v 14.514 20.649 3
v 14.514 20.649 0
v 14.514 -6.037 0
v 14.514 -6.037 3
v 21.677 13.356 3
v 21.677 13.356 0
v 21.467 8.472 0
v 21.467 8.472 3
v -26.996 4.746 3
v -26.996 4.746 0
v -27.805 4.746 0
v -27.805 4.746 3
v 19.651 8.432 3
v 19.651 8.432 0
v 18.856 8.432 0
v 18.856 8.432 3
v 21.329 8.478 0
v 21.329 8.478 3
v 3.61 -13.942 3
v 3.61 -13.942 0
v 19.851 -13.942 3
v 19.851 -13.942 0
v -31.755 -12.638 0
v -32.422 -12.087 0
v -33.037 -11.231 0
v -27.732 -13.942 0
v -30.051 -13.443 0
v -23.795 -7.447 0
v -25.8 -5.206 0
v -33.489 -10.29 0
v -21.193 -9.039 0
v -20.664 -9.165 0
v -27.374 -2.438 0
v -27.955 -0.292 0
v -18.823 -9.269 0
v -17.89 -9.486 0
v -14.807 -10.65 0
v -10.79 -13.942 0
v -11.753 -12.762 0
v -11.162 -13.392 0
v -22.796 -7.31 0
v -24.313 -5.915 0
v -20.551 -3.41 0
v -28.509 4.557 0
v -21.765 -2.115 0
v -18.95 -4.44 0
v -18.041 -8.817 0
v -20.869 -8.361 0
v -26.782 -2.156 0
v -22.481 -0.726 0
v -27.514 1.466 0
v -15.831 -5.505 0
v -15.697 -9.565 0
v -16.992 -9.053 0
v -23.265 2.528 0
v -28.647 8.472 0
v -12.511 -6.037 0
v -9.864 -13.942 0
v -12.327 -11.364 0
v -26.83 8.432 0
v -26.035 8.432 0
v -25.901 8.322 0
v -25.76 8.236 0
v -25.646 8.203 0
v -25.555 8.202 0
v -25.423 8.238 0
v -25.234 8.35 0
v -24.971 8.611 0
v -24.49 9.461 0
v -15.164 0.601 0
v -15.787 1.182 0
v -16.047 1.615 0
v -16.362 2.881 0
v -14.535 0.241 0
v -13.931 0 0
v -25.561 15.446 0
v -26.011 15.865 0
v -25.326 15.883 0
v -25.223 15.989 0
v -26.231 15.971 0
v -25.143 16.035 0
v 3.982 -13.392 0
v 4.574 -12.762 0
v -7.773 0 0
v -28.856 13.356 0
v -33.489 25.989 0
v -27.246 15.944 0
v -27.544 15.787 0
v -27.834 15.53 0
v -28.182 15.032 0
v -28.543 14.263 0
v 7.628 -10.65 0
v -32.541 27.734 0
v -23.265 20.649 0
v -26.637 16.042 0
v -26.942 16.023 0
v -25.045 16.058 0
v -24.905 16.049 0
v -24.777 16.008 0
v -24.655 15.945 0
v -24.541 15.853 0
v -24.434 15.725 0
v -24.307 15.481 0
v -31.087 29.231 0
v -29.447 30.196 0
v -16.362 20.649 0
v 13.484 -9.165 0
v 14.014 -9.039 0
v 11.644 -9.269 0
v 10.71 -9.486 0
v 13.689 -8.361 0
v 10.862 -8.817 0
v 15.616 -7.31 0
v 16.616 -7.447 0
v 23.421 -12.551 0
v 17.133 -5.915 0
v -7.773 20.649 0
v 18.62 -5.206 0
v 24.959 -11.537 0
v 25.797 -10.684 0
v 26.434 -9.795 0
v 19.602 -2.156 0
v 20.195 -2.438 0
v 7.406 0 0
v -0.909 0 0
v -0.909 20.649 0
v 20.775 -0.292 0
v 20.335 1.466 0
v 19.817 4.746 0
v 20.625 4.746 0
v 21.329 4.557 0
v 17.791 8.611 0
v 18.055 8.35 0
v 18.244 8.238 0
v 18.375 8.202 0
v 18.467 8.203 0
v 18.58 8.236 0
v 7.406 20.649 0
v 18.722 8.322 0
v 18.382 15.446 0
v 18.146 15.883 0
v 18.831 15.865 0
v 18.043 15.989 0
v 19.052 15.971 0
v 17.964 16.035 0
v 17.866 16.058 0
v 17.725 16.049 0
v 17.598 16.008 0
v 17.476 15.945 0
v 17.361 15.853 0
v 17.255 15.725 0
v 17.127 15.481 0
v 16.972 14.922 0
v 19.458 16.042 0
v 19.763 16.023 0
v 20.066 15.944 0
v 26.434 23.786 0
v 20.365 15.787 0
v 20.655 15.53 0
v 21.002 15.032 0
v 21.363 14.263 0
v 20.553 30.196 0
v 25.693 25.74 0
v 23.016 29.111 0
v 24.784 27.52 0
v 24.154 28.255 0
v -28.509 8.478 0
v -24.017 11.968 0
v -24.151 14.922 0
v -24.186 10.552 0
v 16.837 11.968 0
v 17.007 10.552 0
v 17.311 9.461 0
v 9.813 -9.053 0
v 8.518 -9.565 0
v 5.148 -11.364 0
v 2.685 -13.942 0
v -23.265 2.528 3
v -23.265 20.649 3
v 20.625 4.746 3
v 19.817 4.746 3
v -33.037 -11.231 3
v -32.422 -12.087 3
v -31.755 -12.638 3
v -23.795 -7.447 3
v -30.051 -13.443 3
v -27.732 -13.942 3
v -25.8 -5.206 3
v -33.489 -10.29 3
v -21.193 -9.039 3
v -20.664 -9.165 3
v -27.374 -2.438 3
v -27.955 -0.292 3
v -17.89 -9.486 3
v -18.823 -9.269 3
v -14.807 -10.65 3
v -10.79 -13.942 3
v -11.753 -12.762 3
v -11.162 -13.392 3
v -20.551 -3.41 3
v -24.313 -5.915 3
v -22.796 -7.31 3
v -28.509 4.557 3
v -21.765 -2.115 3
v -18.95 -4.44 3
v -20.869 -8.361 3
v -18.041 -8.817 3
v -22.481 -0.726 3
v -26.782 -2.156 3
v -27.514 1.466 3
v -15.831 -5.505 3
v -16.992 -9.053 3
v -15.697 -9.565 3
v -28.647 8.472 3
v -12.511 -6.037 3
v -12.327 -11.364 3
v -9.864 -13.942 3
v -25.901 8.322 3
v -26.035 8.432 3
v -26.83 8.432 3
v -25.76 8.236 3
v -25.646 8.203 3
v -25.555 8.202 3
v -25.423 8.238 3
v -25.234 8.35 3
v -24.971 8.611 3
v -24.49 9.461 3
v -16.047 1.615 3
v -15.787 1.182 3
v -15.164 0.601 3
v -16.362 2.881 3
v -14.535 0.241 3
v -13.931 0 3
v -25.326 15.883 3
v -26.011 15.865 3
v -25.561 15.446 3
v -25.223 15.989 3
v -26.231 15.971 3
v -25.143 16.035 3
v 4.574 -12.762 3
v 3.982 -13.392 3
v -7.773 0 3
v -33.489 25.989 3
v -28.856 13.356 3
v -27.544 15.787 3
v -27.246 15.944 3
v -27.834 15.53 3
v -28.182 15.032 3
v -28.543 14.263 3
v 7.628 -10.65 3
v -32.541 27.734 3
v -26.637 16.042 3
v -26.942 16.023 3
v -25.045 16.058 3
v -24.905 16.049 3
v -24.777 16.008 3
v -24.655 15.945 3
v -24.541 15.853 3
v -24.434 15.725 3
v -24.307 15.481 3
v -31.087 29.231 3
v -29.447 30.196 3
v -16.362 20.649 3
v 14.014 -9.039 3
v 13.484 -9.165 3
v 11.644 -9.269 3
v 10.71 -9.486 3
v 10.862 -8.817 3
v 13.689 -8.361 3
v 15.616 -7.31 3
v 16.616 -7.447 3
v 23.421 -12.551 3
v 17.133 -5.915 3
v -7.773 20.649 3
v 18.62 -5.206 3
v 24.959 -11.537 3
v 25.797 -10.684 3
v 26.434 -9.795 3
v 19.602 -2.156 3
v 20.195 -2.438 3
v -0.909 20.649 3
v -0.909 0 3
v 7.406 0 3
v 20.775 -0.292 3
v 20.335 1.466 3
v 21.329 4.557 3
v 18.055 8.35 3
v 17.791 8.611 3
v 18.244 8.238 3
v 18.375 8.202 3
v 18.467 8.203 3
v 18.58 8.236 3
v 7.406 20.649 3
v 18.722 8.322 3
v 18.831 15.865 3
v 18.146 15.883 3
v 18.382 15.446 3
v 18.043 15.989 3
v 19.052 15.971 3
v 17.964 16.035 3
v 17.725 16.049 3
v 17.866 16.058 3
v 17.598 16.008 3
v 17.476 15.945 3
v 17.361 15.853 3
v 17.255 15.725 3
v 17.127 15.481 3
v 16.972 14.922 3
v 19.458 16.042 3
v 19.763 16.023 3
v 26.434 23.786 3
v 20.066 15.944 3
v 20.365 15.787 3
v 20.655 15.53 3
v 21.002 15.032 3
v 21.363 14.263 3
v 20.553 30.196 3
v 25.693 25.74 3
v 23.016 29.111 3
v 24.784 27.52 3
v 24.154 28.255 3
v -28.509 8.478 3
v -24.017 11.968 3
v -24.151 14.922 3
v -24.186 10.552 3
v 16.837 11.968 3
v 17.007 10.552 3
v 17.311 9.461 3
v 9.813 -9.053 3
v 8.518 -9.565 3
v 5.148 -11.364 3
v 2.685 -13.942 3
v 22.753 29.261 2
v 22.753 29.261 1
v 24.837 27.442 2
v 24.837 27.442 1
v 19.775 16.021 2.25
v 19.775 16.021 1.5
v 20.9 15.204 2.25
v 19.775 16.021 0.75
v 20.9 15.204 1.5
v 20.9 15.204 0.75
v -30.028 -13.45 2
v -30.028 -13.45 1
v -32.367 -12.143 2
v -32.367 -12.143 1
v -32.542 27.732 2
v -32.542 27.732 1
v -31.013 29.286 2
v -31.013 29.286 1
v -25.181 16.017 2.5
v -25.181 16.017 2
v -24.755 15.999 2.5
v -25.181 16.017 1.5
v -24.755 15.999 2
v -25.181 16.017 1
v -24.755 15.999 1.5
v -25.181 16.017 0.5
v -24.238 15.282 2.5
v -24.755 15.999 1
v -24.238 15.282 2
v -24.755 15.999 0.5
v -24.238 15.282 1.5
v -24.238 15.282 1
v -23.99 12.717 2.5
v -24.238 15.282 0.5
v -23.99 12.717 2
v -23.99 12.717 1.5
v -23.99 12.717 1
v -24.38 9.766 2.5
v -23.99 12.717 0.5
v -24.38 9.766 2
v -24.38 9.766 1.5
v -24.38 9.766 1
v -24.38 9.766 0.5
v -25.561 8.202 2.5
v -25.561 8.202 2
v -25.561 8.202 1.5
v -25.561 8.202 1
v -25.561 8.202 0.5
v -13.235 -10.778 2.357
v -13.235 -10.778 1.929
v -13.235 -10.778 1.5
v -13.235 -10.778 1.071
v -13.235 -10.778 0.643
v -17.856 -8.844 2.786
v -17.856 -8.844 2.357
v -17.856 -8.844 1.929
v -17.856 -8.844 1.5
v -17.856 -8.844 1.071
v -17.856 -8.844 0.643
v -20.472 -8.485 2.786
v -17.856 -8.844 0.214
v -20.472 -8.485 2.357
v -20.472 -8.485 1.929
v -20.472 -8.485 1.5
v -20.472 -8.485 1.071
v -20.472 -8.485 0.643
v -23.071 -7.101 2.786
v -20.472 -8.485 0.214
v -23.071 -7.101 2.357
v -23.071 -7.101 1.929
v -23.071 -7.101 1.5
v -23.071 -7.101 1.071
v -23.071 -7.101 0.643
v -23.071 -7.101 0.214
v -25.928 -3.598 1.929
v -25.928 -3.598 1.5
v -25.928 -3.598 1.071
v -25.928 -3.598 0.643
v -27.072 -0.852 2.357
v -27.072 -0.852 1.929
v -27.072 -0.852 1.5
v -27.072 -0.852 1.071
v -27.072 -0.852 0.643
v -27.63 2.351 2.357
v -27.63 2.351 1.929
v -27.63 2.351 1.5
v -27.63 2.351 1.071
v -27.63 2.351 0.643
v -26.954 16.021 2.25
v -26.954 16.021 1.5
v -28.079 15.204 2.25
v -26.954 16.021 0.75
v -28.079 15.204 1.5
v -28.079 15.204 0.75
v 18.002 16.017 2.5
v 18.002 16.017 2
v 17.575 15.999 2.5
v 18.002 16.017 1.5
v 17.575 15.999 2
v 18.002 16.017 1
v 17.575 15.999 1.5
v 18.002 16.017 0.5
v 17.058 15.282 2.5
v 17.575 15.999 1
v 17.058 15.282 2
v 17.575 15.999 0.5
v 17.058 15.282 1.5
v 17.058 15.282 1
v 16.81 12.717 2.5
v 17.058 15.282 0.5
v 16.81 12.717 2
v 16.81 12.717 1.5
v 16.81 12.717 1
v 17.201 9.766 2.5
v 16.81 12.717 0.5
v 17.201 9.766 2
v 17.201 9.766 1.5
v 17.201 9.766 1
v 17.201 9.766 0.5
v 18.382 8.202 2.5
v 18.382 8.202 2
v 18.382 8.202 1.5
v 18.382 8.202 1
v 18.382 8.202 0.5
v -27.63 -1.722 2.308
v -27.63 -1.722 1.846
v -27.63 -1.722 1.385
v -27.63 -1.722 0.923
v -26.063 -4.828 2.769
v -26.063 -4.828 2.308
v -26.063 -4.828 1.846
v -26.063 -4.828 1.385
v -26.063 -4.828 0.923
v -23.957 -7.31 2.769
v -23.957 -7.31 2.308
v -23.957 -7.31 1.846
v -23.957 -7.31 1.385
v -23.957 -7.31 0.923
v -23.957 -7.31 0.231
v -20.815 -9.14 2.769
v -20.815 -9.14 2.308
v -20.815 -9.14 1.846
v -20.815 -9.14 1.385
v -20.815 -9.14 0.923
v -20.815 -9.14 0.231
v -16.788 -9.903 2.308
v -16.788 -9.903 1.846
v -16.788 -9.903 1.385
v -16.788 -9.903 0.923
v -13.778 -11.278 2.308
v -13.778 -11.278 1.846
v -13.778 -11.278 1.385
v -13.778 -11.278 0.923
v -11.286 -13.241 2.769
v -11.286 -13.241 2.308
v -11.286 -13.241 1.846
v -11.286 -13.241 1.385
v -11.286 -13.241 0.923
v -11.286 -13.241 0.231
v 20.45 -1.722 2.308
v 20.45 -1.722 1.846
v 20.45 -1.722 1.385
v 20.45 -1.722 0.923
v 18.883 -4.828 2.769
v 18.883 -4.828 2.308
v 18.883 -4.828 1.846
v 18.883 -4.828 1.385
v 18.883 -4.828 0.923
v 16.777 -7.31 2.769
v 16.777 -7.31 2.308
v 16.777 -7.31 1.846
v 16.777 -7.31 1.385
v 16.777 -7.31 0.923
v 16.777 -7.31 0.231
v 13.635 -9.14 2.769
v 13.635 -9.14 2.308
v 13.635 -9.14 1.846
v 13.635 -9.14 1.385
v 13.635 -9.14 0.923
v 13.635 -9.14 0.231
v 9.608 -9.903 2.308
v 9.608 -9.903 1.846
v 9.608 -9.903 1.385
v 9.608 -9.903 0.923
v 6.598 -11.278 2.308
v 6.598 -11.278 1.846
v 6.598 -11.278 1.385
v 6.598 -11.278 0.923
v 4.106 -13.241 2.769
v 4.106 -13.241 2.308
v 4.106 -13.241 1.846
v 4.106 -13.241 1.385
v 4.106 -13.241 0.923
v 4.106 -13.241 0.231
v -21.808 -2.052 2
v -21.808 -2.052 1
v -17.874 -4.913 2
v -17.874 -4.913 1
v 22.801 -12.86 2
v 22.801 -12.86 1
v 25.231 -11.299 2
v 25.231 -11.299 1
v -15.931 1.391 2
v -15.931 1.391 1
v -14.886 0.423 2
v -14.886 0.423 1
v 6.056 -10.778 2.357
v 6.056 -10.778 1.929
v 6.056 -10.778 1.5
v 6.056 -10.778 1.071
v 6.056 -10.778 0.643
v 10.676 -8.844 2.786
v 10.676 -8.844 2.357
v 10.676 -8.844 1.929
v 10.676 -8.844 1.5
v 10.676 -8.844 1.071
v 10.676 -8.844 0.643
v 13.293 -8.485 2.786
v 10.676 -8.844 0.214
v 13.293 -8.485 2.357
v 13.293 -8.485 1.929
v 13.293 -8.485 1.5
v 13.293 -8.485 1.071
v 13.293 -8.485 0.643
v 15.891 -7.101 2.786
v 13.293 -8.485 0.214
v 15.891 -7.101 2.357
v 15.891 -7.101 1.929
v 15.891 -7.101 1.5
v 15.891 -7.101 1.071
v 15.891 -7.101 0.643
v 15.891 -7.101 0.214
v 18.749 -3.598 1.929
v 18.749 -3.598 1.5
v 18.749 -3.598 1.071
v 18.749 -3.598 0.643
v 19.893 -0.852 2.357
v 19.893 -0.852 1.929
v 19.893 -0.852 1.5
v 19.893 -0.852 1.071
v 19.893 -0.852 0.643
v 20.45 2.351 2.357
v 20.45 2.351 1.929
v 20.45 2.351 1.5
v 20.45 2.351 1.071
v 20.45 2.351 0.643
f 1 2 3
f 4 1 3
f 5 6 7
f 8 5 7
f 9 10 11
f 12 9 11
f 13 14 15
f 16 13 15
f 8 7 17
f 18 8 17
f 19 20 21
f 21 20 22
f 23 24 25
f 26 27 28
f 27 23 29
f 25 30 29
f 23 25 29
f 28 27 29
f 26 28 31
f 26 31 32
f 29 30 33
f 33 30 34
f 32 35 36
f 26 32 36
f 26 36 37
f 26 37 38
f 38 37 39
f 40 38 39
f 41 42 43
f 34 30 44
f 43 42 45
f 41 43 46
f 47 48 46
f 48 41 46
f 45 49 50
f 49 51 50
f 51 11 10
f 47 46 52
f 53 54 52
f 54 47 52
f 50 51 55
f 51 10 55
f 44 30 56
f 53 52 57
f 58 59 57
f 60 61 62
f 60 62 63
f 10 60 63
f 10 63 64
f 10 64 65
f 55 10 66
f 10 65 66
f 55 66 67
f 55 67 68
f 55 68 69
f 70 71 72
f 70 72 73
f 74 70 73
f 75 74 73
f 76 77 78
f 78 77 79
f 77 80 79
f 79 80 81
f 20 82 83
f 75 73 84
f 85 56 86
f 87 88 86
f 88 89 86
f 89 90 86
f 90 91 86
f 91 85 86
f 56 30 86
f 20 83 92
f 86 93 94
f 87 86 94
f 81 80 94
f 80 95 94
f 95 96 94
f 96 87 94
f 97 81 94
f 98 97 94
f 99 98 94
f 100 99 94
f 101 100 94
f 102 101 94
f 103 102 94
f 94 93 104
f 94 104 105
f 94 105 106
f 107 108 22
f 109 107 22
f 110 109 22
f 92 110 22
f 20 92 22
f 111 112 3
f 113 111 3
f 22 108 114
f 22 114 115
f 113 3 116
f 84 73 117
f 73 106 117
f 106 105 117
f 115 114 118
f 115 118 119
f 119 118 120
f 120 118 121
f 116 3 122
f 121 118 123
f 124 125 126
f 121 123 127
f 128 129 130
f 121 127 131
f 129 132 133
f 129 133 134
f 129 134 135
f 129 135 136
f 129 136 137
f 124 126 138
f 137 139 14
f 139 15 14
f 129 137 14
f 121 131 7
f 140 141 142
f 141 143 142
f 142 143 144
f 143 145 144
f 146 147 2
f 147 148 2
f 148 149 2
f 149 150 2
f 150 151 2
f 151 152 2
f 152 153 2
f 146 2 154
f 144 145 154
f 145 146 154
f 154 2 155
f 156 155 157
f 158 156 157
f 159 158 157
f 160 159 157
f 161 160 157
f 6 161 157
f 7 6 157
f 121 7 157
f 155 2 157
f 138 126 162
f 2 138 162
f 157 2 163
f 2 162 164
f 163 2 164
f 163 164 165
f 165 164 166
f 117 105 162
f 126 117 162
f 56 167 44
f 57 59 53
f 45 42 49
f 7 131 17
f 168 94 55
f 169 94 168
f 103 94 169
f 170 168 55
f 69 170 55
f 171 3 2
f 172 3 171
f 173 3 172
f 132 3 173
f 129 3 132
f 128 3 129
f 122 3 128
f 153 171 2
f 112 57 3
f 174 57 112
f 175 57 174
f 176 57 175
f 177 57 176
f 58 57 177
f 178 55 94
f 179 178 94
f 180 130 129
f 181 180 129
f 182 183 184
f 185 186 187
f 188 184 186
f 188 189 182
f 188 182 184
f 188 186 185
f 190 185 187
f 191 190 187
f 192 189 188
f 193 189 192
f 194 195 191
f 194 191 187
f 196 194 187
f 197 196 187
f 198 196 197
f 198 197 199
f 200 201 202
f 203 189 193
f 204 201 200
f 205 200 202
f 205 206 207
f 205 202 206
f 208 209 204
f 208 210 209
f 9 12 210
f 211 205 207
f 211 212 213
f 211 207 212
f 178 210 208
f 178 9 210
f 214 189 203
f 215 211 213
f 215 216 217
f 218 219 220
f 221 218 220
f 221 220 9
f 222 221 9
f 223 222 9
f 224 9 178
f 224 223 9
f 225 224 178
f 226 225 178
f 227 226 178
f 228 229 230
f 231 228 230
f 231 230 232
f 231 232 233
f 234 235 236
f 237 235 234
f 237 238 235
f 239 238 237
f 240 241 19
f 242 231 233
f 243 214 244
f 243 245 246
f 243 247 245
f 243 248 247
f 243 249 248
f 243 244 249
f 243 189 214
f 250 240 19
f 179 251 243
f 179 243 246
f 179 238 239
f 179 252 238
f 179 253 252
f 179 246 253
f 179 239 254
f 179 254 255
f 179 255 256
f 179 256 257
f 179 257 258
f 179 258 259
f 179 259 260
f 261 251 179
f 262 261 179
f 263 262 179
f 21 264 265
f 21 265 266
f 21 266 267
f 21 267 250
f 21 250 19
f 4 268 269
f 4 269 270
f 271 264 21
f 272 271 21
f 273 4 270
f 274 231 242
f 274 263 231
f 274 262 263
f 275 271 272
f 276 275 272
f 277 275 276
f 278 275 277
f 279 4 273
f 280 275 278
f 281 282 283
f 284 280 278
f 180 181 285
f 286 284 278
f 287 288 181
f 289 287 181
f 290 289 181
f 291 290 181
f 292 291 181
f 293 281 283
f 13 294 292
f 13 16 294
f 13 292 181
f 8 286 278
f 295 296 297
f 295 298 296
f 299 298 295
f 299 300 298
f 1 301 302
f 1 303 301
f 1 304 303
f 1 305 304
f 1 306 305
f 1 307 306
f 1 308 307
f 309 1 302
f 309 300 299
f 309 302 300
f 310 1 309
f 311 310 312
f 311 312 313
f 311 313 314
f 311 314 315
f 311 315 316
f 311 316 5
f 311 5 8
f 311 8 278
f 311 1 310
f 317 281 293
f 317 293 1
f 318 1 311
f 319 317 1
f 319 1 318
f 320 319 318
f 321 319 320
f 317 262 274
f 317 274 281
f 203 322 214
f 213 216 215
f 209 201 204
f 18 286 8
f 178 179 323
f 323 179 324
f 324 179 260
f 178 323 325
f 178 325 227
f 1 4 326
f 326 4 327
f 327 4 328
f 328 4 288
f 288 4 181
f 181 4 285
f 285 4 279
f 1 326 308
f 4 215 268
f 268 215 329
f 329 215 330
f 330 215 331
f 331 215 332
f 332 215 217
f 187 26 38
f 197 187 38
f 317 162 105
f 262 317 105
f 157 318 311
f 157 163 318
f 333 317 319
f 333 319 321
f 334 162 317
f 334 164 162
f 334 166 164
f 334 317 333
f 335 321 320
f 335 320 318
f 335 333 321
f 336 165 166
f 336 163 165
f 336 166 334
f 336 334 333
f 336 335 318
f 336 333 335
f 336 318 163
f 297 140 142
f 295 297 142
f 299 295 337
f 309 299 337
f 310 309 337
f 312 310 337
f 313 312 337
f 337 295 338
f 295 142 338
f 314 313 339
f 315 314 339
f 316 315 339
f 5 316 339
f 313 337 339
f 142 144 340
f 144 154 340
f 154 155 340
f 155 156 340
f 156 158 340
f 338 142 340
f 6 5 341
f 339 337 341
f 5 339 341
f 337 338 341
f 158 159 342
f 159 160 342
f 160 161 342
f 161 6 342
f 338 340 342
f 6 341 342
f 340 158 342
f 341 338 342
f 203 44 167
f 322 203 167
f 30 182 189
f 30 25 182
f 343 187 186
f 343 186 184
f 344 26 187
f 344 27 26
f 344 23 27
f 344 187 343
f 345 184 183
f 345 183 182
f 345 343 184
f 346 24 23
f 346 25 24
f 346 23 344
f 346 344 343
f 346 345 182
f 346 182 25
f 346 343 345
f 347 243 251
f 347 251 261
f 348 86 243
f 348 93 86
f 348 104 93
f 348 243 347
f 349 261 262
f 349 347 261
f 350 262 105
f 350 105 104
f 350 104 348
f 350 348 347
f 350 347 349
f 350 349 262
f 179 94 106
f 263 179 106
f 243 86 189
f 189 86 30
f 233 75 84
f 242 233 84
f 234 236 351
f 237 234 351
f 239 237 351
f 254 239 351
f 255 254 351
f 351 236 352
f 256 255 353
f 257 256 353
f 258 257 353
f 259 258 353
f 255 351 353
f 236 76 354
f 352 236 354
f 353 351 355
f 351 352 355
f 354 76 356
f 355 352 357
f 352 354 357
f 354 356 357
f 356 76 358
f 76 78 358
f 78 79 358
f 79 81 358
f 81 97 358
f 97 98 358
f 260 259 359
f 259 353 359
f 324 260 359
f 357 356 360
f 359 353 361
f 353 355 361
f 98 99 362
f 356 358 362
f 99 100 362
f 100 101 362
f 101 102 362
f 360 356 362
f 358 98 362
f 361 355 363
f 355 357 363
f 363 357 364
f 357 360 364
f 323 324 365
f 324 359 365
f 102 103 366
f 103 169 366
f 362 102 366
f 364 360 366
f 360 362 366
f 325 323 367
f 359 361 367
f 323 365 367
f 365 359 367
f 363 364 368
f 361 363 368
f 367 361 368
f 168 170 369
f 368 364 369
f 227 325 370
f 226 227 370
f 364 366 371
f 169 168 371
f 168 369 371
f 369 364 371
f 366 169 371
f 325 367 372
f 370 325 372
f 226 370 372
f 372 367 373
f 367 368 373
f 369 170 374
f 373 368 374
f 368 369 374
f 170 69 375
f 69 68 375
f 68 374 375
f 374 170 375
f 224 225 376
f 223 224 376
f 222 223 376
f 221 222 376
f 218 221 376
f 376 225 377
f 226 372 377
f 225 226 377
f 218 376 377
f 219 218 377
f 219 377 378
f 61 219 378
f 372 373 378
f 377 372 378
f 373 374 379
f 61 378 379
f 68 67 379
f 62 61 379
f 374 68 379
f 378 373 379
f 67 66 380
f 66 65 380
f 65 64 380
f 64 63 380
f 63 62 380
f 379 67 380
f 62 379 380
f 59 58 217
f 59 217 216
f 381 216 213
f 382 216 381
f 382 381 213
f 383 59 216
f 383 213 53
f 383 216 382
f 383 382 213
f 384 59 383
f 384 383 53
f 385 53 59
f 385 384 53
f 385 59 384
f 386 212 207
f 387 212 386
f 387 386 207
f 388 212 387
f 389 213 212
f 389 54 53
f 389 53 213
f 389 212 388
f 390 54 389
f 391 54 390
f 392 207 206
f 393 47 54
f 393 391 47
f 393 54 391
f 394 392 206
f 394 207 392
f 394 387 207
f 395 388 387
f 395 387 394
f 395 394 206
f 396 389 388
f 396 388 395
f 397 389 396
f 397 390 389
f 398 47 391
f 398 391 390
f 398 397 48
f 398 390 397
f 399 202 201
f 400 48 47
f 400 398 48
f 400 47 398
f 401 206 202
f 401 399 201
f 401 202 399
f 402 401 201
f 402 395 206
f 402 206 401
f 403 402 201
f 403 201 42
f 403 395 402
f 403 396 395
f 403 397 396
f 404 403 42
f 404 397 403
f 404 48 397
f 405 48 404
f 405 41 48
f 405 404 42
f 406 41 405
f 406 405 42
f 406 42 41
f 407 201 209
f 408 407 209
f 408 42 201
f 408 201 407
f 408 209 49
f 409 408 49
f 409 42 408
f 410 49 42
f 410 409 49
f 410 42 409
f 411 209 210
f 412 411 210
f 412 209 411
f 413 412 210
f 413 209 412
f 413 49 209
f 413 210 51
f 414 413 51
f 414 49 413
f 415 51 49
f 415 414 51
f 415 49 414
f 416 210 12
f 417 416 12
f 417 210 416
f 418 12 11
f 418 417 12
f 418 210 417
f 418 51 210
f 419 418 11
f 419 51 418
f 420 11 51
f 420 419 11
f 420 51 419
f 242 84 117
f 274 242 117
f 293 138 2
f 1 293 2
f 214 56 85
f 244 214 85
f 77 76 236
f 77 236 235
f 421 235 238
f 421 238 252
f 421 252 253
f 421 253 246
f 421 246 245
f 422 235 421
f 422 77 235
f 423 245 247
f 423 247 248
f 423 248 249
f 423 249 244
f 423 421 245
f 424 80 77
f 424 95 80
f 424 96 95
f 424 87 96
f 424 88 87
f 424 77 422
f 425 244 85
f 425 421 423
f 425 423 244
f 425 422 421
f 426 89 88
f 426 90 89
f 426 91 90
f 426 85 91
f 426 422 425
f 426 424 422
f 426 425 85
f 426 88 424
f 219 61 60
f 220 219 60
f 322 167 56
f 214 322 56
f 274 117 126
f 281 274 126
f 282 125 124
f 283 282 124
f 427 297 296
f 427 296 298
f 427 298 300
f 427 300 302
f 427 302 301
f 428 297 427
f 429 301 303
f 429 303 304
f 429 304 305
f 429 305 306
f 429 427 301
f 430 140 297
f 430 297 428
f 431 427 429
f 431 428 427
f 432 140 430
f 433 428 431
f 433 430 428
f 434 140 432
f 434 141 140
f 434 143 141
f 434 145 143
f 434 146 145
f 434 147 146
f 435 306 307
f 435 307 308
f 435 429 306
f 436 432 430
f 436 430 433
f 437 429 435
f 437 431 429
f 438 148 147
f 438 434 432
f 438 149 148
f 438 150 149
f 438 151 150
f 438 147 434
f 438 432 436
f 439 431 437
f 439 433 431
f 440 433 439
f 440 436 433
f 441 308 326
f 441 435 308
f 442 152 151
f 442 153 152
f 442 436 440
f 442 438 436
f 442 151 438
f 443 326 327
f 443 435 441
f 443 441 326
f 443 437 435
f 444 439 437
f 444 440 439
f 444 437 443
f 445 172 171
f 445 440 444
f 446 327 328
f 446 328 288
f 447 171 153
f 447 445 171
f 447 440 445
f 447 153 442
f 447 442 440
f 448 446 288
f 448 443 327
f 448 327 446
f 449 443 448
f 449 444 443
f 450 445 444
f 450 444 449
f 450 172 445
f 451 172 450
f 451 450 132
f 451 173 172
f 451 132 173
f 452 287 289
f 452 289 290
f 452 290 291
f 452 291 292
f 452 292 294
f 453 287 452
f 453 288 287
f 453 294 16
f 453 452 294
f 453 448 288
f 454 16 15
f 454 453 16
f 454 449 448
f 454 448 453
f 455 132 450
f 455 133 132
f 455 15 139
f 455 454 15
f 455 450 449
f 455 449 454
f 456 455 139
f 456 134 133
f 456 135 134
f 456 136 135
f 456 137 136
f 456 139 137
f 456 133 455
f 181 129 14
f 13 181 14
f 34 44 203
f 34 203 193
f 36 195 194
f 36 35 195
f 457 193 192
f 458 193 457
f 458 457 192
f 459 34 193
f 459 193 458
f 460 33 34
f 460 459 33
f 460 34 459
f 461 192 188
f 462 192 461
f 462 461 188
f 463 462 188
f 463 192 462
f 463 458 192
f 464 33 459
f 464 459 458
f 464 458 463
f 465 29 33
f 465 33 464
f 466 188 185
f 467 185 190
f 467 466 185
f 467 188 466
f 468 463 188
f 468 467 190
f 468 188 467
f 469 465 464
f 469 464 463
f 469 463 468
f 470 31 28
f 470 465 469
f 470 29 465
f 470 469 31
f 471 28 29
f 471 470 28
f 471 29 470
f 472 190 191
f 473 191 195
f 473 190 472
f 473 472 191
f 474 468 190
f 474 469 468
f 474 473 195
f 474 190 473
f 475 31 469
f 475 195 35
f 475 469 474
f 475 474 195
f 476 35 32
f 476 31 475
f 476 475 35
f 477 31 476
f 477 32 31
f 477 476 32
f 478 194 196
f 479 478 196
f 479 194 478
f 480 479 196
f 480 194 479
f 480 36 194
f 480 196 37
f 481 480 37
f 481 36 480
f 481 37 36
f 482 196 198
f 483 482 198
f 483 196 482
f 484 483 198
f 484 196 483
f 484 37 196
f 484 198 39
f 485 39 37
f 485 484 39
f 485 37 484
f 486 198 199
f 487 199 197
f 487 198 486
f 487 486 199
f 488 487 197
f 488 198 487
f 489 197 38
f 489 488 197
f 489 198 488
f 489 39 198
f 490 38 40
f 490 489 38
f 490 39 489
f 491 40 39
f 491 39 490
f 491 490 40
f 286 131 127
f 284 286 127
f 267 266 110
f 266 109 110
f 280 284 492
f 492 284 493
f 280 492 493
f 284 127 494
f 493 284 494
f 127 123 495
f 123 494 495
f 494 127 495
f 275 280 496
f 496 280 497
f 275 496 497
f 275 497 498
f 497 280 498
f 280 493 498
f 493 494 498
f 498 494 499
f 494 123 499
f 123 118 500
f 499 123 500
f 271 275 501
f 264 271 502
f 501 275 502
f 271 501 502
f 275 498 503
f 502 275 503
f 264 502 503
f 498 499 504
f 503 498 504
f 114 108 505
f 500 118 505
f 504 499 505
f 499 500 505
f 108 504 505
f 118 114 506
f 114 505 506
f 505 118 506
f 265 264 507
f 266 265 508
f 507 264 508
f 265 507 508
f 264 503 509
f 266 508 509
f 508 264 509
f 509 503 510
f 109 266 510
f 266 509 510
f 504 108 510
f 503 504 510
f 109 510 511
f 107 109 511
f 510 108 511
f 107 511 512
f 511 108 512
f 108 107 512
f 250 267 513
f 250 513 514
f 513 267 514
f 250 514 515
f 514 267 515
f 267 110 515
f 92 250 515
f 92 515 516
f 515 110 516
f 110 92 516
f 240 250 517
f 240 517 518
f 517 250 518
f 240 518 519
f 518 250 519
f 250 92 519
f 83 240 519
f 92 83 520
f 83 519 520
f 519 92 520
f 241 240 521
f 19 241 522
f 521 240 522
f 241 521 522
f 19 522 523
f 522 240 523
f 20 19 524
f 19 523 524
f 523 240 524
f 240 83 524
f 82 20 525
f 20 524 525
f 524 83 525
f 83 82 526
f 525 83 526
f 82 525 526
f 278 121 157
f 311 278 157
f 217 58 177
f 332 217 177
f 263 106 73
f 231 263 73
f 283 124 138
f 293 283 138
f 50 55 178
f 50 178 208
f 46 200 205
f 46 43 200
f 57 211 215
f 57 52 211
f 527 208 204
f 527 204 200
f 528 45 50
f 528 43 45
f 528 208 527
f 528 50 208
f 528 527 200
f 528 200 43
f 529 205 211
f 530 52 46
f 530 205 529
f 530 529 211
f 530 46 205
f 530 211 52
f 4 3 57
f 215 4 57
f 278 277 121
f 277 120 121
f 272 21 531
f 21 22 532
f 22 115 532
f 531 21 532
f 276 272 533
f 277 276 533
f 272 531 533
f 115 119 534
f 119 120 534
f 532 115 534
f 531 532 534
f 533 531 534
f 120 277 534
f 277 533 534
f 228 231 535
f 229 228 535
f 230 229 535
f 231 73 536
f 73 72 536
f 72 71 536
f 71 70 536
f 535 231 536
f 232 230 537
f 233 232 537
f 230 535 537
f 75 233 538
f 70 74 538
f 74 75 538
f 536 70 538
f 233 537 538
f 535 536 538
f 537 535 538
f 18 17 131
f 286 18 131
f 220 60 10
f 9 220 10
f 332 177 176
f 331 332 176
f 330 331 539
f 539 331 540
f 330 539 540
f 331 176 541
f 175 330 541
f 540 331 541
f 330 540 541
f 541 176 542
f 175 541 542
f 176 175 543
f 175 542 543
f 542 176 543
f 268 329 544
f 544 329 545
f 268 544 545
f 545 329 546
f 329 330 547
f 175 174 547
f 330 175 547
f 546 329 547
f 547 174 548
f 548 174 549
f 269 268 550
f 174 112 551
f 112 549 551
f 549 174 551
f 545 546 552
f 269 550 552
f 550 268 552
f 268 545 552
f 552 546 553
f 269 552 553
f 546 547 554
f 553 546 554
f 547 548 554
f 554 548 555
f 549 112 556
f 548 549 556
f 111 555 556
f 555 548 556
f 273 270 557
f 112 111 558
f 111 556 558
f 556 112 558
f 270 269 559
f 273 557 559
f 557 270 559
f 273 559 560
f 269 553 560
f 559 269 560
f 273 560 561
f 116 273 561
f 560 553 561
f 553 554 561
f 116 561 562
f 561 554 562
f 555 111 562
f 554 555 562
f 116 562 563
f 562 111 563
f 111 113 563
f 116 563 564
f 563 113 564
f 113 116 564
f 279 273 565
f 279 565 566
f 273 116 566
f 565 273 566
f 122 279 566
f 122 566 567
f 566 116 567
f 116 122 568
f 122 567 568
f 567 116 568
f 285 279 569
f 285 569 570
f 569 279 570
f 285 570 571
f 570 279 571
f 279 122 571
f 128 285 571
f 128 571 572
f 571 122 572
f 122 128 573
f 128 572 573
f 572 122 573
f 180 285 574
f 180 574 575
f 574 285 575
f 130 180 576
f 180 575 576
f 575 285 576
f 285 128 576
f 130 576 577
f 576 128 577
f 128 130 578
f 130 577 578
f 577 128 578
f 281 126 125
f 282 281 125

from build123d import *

# Parameters (mm, degrees)
F1_DEPTH = 3


with BuildPart() as f1:
    # F0 (on Top) → F1 (new body)
    with BuildSketch(Plane.XY):
        with BuildLine():
            Line((20.5527181621, 30.195697915), (-29.4472818379, 30.195697915))
            add(Edge.make_bspline(
                [(-33.4885001085, 25.9894452414), (-33.213703802, 26.5808699423), (-32.6507121711, 27.7925571051), (-31.0757898275, 29.37360199), (-29.9730210707, 29.9302966497), (-29.4472818379, 30.195697915)],
                knots=[0, 0, 0, 0, 0.3328563765, 0.6819427693, 1, 1, 1, 1], degree=3))
            Line((-33.4885001085, 25.9894452414), (-33.4885001085, -10.2902378456))
            add(Edge.make_bspline(
                [(-27.7322423042, -13.9418656194), (-28.4836058117, -13.8252421446), (-30.0375167068, -13.5840506488), (-32.5768259091, -12.3435159595), (-33.1955576712, -10.9500045645), (-33.4885001085, -10.2902378456)],
                knots=[0, 0, 0, 0, 0.3301907957, 0.682874627, 1, 1, 1, 1], degree=3))
            Line((-27.7322423042, -13.9418656194), (-10.7898019482, -13.9418656194))
            add(Edge.make_bspline(
                [(-28.5088235463, 4.5570421469), (-28.3963078081, 3.5536701607), (-28.1672579469, 1.5110917816), (-27.8457487973, -1.8036249304), (-26.1769655582, -4.8521782939), (-24.1052736346, -7.3811315964), (-22.2723113651, -8.4849159584), (-20.8619134501, -9.3358274832), (-18.592595939, -9.0991872739), (-16.8258854922, -9.9550678155), (-15.1376214427, -10.3836937437), (-13.7721703287, -11.2919130026), (-12.4961650489, -12.0776401334), (-11.2562944693, -13.1877426319), (-10.9278471754, -13.7187043157), (-10.7898019482, -13.9418656194)],
                knots=[0, 0, 0, 0, 0.0929243816, 0.1891674626, 0.288234633, 0.3840724913, 0.4607153882, 0.5272820506, 0.60555499, 0.6798904382, 0.7496193013, 0.8168147609, 0.8828740561, 0.9507723831, 1, 1, 1, 1], degree=3))
            Line((-28.5088235463, 4.5570421469), (-28.5088235463, 8.478385812))
            Line((-28.5088235463, 8.478385812), (-28.6465575529, 8.4724735778))
            Line((-28.6465575529, 8.4724735778), (-28.856180302, 13.3559372531))
            add(Edge.make_bspline(
                [(-25.5610939354, 15.445505253), (-25.7202536842, 15.6250241148), (-26.0547418232, 16.0022987113), (-27.0404386684, 16.1175815198), (-28.1920106621, 15.5122913758), (-28.8686699031, 13.3783552584), (-28.856180302, 13.3559372531)],
                knots=[0, 0, 0, 0, 0.1912766505, 0.4019846184, 0.6693050093, 0.9903074667, 0.9903074667, 0.9903074667, 0.9903074667], degree=3))
            add(Edge.make_bspline(
                [(-25.5610939354, 15.445505253), (-25.4510607343, 15.6864427113), (-25.2542498411, 16.1173955139), (-24.672470838, 16.0292127347), (-23.9254769017, 15.2814700519), (-23.8315402851, 9.7381500352), (-25.4687543478, 7.9443834682), (-25.8909183497, 8.3081683223), (-26.0350888111, 8.4324021036)],
                knots=[0, 0, 0, 0, 0.1200958505, 0.2148094519, 0.3511054974, 0.6917004605, 0.8947146449, 1, 1, 1, 1], degree=3))
            Line((-26.0350888111, 8.4324021036), (-26.8303478097, 8.4324021036))
            Line((-26.8303478097, 8.4324021036), (-26.9962109493, 4.7458451406))
            Line((-26.9962109493, 4.7458451406), (-27.8046563828, 4.7458451406))
            add(Edge.make_bspline(
                [(-9.8643423474, -13.9418656194), (-10.4228235309, -13.2559319779), (-11.4892555432, -11.9461267143), (-13.1703868992, -10.7229947742), (-15.8958370989, -9.4484884404), (-17.8112127607, -8.705095499), (-20.5599194862, -8.7415516056), (-23.1492858216, -7.1967512579), (-24.7741798058, -5.4807986695), (-25.8782752386, -3.5929053261), (-26.8058199051, -2.4479926091), (-27.0574701536, -0.8485923563), (-27.4420496003, 0.9748753662), (-27.6455521715, 2.2734168237), (-27.7760395118, 4.1540133465), (-27.7971303251, 4.5901970895), (-27.8046563828, 4.7458451406)],
                knots=[0, 0, 0, 0, 0.0811318182, 0.1549229781, 0.242183123, 0.3154777228, 0.3981332361, 0.4853975139, 0.564102051, 0.6385914444, 0.6993278926, 0.7634010469, 0.8322739833, 0.8928474316, 0.9617636175, 1, 1, 1, 1], degree=3))
            Line((-9.8643423474, -13.9418656194), (2.6848182054, -13.9418656194))
            add(Edge.make_bspline(
                [(2.6848182054, -13.9418656194), (3.2432993889, -13.2559319779), (4.3097314011, -11.9461267143), (5.9908627572, -10.7229947742), (8.7163129569, -9.4484884404), (10.6316886187, -8.705095499), (13.3803953442, -8.7415516056), (15.9697616796, -7.1967512579), (17.5946556638, -5.4807986695), (18.6987510966, -3.5929053261), (19.626295763, -2.4479926091), (19.8779460115, -0.8485923563), (20.2625254583, 0.9748753662), (20.4660280294, 2.2734168237), (20.5965153698, 4.1540133465), (20.6176061831, 4.5901970895), (20.6251322408, 4.7458451406)],
                knots=[0, 0, 0, 0, 0.0811318182, 0.1549229781, 0.242183123, 0.3154777228, 0.3981332361, 0.4853975139, 0.564102051, 0.6385914444, 0.6993278926, 0.7634010469, 0.8322739833, 0.8928474316, 0.9617636175, 1, 1, 1, 1], degree=3))
            Line((20.6251322408, 4.7458451406), (19.8166868073, 4.7458451406))
            Line((19.8166868073, 4.7458451406), (19.6508236677, 8.4324021036))
            Line((19.6508236677, 8.4324021036), (18.8555646691, 8.4324021036))
            add(Edge.make_bspline(
                [(18.3815697934, 15.445505253), (18.2715365923, 15.6864427113), (18.0747256991, 16.1173955139), (17.492946696, 16.0292127347), (16.7459527597, 15.2814700519), (16.6520161431, 9.7381500352), (18.2892302058, 7.9443834682), (18.7113942077, 8.3081683223), (18.8555646691, 8.4324021036)],
                knots=[0, 0, 0, 0, 0.1200958505, 0.2148094519, 0.3511054974, 0.6917004605, 0.8947146449, 1, 1, 1, 1], degree=3))
            add(Edge.make_bspline(
                [(18.3815697934, 15.445505253), (18.5407295422, 15.6250241148), (18.8752176812, 16.0022987113), (19.8609145264, 16.1175815198), (21.0124865201, 15.5122913758), (21.6891457611, 13.3783552584), (21.67665616, 13.3559372531)],
                knots=[0, 0, 0, 0, 0.1912766505, 0.4019846184, 0.6693050093, 0.9903074667, 0.9903074667, 0.9903074667, 0.9903074667], degree=3))
            Line((21.67665616, 13.3559372531), (21.4670334109, 8.4724735778))
            Line((21.4670334109, 8.4724735778), (21.3292994042, 8.478385812))
            Line((21.3292994042, 8.478385812), (21.3292994042, 4.5570421469))
            add(Edge.make_bspline(
                [(21.3292994042, 4.5570421469), (21.2167836661, 3.5536701607), (20.9877338049, 1.5110917816), (20.6662246553, -1.8036249304), (18.9974414162, -4.8521782939), (16.9257494926, -7.3811315964), (15.0927872231, -8.4849159584), (13.6823893081, -9.3358274832), (11.413071797, -9.0991872739), (9.6463613501, -9.9550678155), (7.9580973007, -10.3836937437), (6.5926461867, -11.2919130026), (5.3166409069, -12.0776401334), (4.0767703273, -13.1877426319), (3.7483230334, -13.7187043157), (3.6102778062, -13.9418656194)],
                knots=[0, 0, 0, 0, 0.0929243816, 0.1891674626, 0.288234633, 0.3840724913, 0.4607153882, 0.5272820506, 0.60555499, 0.6798904382, 0.7496193013, 0.8168147609, 0.8828740561, 0.9507723831, 1, 1, 1, 1], degree=3))
            Line((3.6102778062, -13.9418656194), (19.8514924581, -13.9418656194))
            add(Edge.make_bspline(
                [(19.8514924581, -13.9418656194), (20.8477088835, -13.6239308956), (22.7990353174, -13.0011802412), (25.3220593168, -11.4430657877), (26.0894092473, -10.305916103), (26.4343726067, -9.7947086866)],
                knots=[0, 0, 0, 0, 0.3647320307, 0.7144142924, 1, 1, 1, 1], degree=3))
            Line((26.4343726067, -9.7947086866), (26.4343726067, 23.7857923042))
            add(Edge.make_bspline(
                [(20.5527181621, 30.195697915), (21.2833579401, 29.9339812014), (22.8395419668, 29.3524729862), (25.1574728875, 27.6199003715), (25.9560887811, 25.0016155559), (26.4343726067, 23.7857923042)],
                knots=[0, 0, 0, 0, 0.2969729715, 0.6163665308, 1, 1, 1, 1], degree=3))
        make_face()
        with BuildLine():
            Line((-23.2653390975, 2.5283608725), (-23.2653390975, 20.6488644777))
            Line((-23.2653390975, 20.6488644777), (-16.3622886956, 20.6488644777))
            Line((-16.3622886956, 20.6488644777), (-16.3622886956, 2.8813569857))
            add(Edge.make_bspline(
                [(-16.3622886956, 2.8813569857), (-16.2766822422, 2.3529362143), (-16.1090692339, 1.3183156735), (-14.9211291825, 0.3659074087), (-14.2433134647, 0.1155350226), (-13.9305335471, 0)],
                knots=[0, 0, 0, 0, 0.3598722801, 0.7046113121, 1, 1, 1, 1], degree=3))
            Line((-13.9305335471, 0), (-7.7726994497, 0))
            Line((-7.7726994497, 0), (-7.7726994497, 20.6488644777))
            Line((-7.7726994497, 20.6488644777), (-0.9088727238, 20.6488644777))
            Line((-0.9088727238, 20.6488644777), (-0.9088727238, 0))
            Line((-0.9088727238, 0), (7.4061643025, 0))
            Line((7.4061643025, 0), (7.4061643025, 20.6488644777))
            Line((7.4061643025, 20.6488644777), (14.5135857856, 20.6488644777))
            Line((14.5135857856, 20.6488644777), (14.5135857856, -6.0365998399))
            Line((14.5135857856, -6.0365998399), (-12.5105396895, -6.0365998399))
            add(Edge.make_bspline(
                [(-23.2653390975, 2.5283608725), (-22.972712073, 0.886412802), (-22.3857188434, -2.4072419863), (-17.9138591634, -5.3236731255), (-14.3471111697, -5.7942782675), (-12.5105396895, -6.0365998399)],
                knots=[0, 0, 0, 0, 0.325335941, 0.6526054626, 1, 1, 1, 1], degree=3))
        make_face(mode=Mode.SUBTRACT)
    extrude(amount=F1_DEPTH)


solid = f1.part
